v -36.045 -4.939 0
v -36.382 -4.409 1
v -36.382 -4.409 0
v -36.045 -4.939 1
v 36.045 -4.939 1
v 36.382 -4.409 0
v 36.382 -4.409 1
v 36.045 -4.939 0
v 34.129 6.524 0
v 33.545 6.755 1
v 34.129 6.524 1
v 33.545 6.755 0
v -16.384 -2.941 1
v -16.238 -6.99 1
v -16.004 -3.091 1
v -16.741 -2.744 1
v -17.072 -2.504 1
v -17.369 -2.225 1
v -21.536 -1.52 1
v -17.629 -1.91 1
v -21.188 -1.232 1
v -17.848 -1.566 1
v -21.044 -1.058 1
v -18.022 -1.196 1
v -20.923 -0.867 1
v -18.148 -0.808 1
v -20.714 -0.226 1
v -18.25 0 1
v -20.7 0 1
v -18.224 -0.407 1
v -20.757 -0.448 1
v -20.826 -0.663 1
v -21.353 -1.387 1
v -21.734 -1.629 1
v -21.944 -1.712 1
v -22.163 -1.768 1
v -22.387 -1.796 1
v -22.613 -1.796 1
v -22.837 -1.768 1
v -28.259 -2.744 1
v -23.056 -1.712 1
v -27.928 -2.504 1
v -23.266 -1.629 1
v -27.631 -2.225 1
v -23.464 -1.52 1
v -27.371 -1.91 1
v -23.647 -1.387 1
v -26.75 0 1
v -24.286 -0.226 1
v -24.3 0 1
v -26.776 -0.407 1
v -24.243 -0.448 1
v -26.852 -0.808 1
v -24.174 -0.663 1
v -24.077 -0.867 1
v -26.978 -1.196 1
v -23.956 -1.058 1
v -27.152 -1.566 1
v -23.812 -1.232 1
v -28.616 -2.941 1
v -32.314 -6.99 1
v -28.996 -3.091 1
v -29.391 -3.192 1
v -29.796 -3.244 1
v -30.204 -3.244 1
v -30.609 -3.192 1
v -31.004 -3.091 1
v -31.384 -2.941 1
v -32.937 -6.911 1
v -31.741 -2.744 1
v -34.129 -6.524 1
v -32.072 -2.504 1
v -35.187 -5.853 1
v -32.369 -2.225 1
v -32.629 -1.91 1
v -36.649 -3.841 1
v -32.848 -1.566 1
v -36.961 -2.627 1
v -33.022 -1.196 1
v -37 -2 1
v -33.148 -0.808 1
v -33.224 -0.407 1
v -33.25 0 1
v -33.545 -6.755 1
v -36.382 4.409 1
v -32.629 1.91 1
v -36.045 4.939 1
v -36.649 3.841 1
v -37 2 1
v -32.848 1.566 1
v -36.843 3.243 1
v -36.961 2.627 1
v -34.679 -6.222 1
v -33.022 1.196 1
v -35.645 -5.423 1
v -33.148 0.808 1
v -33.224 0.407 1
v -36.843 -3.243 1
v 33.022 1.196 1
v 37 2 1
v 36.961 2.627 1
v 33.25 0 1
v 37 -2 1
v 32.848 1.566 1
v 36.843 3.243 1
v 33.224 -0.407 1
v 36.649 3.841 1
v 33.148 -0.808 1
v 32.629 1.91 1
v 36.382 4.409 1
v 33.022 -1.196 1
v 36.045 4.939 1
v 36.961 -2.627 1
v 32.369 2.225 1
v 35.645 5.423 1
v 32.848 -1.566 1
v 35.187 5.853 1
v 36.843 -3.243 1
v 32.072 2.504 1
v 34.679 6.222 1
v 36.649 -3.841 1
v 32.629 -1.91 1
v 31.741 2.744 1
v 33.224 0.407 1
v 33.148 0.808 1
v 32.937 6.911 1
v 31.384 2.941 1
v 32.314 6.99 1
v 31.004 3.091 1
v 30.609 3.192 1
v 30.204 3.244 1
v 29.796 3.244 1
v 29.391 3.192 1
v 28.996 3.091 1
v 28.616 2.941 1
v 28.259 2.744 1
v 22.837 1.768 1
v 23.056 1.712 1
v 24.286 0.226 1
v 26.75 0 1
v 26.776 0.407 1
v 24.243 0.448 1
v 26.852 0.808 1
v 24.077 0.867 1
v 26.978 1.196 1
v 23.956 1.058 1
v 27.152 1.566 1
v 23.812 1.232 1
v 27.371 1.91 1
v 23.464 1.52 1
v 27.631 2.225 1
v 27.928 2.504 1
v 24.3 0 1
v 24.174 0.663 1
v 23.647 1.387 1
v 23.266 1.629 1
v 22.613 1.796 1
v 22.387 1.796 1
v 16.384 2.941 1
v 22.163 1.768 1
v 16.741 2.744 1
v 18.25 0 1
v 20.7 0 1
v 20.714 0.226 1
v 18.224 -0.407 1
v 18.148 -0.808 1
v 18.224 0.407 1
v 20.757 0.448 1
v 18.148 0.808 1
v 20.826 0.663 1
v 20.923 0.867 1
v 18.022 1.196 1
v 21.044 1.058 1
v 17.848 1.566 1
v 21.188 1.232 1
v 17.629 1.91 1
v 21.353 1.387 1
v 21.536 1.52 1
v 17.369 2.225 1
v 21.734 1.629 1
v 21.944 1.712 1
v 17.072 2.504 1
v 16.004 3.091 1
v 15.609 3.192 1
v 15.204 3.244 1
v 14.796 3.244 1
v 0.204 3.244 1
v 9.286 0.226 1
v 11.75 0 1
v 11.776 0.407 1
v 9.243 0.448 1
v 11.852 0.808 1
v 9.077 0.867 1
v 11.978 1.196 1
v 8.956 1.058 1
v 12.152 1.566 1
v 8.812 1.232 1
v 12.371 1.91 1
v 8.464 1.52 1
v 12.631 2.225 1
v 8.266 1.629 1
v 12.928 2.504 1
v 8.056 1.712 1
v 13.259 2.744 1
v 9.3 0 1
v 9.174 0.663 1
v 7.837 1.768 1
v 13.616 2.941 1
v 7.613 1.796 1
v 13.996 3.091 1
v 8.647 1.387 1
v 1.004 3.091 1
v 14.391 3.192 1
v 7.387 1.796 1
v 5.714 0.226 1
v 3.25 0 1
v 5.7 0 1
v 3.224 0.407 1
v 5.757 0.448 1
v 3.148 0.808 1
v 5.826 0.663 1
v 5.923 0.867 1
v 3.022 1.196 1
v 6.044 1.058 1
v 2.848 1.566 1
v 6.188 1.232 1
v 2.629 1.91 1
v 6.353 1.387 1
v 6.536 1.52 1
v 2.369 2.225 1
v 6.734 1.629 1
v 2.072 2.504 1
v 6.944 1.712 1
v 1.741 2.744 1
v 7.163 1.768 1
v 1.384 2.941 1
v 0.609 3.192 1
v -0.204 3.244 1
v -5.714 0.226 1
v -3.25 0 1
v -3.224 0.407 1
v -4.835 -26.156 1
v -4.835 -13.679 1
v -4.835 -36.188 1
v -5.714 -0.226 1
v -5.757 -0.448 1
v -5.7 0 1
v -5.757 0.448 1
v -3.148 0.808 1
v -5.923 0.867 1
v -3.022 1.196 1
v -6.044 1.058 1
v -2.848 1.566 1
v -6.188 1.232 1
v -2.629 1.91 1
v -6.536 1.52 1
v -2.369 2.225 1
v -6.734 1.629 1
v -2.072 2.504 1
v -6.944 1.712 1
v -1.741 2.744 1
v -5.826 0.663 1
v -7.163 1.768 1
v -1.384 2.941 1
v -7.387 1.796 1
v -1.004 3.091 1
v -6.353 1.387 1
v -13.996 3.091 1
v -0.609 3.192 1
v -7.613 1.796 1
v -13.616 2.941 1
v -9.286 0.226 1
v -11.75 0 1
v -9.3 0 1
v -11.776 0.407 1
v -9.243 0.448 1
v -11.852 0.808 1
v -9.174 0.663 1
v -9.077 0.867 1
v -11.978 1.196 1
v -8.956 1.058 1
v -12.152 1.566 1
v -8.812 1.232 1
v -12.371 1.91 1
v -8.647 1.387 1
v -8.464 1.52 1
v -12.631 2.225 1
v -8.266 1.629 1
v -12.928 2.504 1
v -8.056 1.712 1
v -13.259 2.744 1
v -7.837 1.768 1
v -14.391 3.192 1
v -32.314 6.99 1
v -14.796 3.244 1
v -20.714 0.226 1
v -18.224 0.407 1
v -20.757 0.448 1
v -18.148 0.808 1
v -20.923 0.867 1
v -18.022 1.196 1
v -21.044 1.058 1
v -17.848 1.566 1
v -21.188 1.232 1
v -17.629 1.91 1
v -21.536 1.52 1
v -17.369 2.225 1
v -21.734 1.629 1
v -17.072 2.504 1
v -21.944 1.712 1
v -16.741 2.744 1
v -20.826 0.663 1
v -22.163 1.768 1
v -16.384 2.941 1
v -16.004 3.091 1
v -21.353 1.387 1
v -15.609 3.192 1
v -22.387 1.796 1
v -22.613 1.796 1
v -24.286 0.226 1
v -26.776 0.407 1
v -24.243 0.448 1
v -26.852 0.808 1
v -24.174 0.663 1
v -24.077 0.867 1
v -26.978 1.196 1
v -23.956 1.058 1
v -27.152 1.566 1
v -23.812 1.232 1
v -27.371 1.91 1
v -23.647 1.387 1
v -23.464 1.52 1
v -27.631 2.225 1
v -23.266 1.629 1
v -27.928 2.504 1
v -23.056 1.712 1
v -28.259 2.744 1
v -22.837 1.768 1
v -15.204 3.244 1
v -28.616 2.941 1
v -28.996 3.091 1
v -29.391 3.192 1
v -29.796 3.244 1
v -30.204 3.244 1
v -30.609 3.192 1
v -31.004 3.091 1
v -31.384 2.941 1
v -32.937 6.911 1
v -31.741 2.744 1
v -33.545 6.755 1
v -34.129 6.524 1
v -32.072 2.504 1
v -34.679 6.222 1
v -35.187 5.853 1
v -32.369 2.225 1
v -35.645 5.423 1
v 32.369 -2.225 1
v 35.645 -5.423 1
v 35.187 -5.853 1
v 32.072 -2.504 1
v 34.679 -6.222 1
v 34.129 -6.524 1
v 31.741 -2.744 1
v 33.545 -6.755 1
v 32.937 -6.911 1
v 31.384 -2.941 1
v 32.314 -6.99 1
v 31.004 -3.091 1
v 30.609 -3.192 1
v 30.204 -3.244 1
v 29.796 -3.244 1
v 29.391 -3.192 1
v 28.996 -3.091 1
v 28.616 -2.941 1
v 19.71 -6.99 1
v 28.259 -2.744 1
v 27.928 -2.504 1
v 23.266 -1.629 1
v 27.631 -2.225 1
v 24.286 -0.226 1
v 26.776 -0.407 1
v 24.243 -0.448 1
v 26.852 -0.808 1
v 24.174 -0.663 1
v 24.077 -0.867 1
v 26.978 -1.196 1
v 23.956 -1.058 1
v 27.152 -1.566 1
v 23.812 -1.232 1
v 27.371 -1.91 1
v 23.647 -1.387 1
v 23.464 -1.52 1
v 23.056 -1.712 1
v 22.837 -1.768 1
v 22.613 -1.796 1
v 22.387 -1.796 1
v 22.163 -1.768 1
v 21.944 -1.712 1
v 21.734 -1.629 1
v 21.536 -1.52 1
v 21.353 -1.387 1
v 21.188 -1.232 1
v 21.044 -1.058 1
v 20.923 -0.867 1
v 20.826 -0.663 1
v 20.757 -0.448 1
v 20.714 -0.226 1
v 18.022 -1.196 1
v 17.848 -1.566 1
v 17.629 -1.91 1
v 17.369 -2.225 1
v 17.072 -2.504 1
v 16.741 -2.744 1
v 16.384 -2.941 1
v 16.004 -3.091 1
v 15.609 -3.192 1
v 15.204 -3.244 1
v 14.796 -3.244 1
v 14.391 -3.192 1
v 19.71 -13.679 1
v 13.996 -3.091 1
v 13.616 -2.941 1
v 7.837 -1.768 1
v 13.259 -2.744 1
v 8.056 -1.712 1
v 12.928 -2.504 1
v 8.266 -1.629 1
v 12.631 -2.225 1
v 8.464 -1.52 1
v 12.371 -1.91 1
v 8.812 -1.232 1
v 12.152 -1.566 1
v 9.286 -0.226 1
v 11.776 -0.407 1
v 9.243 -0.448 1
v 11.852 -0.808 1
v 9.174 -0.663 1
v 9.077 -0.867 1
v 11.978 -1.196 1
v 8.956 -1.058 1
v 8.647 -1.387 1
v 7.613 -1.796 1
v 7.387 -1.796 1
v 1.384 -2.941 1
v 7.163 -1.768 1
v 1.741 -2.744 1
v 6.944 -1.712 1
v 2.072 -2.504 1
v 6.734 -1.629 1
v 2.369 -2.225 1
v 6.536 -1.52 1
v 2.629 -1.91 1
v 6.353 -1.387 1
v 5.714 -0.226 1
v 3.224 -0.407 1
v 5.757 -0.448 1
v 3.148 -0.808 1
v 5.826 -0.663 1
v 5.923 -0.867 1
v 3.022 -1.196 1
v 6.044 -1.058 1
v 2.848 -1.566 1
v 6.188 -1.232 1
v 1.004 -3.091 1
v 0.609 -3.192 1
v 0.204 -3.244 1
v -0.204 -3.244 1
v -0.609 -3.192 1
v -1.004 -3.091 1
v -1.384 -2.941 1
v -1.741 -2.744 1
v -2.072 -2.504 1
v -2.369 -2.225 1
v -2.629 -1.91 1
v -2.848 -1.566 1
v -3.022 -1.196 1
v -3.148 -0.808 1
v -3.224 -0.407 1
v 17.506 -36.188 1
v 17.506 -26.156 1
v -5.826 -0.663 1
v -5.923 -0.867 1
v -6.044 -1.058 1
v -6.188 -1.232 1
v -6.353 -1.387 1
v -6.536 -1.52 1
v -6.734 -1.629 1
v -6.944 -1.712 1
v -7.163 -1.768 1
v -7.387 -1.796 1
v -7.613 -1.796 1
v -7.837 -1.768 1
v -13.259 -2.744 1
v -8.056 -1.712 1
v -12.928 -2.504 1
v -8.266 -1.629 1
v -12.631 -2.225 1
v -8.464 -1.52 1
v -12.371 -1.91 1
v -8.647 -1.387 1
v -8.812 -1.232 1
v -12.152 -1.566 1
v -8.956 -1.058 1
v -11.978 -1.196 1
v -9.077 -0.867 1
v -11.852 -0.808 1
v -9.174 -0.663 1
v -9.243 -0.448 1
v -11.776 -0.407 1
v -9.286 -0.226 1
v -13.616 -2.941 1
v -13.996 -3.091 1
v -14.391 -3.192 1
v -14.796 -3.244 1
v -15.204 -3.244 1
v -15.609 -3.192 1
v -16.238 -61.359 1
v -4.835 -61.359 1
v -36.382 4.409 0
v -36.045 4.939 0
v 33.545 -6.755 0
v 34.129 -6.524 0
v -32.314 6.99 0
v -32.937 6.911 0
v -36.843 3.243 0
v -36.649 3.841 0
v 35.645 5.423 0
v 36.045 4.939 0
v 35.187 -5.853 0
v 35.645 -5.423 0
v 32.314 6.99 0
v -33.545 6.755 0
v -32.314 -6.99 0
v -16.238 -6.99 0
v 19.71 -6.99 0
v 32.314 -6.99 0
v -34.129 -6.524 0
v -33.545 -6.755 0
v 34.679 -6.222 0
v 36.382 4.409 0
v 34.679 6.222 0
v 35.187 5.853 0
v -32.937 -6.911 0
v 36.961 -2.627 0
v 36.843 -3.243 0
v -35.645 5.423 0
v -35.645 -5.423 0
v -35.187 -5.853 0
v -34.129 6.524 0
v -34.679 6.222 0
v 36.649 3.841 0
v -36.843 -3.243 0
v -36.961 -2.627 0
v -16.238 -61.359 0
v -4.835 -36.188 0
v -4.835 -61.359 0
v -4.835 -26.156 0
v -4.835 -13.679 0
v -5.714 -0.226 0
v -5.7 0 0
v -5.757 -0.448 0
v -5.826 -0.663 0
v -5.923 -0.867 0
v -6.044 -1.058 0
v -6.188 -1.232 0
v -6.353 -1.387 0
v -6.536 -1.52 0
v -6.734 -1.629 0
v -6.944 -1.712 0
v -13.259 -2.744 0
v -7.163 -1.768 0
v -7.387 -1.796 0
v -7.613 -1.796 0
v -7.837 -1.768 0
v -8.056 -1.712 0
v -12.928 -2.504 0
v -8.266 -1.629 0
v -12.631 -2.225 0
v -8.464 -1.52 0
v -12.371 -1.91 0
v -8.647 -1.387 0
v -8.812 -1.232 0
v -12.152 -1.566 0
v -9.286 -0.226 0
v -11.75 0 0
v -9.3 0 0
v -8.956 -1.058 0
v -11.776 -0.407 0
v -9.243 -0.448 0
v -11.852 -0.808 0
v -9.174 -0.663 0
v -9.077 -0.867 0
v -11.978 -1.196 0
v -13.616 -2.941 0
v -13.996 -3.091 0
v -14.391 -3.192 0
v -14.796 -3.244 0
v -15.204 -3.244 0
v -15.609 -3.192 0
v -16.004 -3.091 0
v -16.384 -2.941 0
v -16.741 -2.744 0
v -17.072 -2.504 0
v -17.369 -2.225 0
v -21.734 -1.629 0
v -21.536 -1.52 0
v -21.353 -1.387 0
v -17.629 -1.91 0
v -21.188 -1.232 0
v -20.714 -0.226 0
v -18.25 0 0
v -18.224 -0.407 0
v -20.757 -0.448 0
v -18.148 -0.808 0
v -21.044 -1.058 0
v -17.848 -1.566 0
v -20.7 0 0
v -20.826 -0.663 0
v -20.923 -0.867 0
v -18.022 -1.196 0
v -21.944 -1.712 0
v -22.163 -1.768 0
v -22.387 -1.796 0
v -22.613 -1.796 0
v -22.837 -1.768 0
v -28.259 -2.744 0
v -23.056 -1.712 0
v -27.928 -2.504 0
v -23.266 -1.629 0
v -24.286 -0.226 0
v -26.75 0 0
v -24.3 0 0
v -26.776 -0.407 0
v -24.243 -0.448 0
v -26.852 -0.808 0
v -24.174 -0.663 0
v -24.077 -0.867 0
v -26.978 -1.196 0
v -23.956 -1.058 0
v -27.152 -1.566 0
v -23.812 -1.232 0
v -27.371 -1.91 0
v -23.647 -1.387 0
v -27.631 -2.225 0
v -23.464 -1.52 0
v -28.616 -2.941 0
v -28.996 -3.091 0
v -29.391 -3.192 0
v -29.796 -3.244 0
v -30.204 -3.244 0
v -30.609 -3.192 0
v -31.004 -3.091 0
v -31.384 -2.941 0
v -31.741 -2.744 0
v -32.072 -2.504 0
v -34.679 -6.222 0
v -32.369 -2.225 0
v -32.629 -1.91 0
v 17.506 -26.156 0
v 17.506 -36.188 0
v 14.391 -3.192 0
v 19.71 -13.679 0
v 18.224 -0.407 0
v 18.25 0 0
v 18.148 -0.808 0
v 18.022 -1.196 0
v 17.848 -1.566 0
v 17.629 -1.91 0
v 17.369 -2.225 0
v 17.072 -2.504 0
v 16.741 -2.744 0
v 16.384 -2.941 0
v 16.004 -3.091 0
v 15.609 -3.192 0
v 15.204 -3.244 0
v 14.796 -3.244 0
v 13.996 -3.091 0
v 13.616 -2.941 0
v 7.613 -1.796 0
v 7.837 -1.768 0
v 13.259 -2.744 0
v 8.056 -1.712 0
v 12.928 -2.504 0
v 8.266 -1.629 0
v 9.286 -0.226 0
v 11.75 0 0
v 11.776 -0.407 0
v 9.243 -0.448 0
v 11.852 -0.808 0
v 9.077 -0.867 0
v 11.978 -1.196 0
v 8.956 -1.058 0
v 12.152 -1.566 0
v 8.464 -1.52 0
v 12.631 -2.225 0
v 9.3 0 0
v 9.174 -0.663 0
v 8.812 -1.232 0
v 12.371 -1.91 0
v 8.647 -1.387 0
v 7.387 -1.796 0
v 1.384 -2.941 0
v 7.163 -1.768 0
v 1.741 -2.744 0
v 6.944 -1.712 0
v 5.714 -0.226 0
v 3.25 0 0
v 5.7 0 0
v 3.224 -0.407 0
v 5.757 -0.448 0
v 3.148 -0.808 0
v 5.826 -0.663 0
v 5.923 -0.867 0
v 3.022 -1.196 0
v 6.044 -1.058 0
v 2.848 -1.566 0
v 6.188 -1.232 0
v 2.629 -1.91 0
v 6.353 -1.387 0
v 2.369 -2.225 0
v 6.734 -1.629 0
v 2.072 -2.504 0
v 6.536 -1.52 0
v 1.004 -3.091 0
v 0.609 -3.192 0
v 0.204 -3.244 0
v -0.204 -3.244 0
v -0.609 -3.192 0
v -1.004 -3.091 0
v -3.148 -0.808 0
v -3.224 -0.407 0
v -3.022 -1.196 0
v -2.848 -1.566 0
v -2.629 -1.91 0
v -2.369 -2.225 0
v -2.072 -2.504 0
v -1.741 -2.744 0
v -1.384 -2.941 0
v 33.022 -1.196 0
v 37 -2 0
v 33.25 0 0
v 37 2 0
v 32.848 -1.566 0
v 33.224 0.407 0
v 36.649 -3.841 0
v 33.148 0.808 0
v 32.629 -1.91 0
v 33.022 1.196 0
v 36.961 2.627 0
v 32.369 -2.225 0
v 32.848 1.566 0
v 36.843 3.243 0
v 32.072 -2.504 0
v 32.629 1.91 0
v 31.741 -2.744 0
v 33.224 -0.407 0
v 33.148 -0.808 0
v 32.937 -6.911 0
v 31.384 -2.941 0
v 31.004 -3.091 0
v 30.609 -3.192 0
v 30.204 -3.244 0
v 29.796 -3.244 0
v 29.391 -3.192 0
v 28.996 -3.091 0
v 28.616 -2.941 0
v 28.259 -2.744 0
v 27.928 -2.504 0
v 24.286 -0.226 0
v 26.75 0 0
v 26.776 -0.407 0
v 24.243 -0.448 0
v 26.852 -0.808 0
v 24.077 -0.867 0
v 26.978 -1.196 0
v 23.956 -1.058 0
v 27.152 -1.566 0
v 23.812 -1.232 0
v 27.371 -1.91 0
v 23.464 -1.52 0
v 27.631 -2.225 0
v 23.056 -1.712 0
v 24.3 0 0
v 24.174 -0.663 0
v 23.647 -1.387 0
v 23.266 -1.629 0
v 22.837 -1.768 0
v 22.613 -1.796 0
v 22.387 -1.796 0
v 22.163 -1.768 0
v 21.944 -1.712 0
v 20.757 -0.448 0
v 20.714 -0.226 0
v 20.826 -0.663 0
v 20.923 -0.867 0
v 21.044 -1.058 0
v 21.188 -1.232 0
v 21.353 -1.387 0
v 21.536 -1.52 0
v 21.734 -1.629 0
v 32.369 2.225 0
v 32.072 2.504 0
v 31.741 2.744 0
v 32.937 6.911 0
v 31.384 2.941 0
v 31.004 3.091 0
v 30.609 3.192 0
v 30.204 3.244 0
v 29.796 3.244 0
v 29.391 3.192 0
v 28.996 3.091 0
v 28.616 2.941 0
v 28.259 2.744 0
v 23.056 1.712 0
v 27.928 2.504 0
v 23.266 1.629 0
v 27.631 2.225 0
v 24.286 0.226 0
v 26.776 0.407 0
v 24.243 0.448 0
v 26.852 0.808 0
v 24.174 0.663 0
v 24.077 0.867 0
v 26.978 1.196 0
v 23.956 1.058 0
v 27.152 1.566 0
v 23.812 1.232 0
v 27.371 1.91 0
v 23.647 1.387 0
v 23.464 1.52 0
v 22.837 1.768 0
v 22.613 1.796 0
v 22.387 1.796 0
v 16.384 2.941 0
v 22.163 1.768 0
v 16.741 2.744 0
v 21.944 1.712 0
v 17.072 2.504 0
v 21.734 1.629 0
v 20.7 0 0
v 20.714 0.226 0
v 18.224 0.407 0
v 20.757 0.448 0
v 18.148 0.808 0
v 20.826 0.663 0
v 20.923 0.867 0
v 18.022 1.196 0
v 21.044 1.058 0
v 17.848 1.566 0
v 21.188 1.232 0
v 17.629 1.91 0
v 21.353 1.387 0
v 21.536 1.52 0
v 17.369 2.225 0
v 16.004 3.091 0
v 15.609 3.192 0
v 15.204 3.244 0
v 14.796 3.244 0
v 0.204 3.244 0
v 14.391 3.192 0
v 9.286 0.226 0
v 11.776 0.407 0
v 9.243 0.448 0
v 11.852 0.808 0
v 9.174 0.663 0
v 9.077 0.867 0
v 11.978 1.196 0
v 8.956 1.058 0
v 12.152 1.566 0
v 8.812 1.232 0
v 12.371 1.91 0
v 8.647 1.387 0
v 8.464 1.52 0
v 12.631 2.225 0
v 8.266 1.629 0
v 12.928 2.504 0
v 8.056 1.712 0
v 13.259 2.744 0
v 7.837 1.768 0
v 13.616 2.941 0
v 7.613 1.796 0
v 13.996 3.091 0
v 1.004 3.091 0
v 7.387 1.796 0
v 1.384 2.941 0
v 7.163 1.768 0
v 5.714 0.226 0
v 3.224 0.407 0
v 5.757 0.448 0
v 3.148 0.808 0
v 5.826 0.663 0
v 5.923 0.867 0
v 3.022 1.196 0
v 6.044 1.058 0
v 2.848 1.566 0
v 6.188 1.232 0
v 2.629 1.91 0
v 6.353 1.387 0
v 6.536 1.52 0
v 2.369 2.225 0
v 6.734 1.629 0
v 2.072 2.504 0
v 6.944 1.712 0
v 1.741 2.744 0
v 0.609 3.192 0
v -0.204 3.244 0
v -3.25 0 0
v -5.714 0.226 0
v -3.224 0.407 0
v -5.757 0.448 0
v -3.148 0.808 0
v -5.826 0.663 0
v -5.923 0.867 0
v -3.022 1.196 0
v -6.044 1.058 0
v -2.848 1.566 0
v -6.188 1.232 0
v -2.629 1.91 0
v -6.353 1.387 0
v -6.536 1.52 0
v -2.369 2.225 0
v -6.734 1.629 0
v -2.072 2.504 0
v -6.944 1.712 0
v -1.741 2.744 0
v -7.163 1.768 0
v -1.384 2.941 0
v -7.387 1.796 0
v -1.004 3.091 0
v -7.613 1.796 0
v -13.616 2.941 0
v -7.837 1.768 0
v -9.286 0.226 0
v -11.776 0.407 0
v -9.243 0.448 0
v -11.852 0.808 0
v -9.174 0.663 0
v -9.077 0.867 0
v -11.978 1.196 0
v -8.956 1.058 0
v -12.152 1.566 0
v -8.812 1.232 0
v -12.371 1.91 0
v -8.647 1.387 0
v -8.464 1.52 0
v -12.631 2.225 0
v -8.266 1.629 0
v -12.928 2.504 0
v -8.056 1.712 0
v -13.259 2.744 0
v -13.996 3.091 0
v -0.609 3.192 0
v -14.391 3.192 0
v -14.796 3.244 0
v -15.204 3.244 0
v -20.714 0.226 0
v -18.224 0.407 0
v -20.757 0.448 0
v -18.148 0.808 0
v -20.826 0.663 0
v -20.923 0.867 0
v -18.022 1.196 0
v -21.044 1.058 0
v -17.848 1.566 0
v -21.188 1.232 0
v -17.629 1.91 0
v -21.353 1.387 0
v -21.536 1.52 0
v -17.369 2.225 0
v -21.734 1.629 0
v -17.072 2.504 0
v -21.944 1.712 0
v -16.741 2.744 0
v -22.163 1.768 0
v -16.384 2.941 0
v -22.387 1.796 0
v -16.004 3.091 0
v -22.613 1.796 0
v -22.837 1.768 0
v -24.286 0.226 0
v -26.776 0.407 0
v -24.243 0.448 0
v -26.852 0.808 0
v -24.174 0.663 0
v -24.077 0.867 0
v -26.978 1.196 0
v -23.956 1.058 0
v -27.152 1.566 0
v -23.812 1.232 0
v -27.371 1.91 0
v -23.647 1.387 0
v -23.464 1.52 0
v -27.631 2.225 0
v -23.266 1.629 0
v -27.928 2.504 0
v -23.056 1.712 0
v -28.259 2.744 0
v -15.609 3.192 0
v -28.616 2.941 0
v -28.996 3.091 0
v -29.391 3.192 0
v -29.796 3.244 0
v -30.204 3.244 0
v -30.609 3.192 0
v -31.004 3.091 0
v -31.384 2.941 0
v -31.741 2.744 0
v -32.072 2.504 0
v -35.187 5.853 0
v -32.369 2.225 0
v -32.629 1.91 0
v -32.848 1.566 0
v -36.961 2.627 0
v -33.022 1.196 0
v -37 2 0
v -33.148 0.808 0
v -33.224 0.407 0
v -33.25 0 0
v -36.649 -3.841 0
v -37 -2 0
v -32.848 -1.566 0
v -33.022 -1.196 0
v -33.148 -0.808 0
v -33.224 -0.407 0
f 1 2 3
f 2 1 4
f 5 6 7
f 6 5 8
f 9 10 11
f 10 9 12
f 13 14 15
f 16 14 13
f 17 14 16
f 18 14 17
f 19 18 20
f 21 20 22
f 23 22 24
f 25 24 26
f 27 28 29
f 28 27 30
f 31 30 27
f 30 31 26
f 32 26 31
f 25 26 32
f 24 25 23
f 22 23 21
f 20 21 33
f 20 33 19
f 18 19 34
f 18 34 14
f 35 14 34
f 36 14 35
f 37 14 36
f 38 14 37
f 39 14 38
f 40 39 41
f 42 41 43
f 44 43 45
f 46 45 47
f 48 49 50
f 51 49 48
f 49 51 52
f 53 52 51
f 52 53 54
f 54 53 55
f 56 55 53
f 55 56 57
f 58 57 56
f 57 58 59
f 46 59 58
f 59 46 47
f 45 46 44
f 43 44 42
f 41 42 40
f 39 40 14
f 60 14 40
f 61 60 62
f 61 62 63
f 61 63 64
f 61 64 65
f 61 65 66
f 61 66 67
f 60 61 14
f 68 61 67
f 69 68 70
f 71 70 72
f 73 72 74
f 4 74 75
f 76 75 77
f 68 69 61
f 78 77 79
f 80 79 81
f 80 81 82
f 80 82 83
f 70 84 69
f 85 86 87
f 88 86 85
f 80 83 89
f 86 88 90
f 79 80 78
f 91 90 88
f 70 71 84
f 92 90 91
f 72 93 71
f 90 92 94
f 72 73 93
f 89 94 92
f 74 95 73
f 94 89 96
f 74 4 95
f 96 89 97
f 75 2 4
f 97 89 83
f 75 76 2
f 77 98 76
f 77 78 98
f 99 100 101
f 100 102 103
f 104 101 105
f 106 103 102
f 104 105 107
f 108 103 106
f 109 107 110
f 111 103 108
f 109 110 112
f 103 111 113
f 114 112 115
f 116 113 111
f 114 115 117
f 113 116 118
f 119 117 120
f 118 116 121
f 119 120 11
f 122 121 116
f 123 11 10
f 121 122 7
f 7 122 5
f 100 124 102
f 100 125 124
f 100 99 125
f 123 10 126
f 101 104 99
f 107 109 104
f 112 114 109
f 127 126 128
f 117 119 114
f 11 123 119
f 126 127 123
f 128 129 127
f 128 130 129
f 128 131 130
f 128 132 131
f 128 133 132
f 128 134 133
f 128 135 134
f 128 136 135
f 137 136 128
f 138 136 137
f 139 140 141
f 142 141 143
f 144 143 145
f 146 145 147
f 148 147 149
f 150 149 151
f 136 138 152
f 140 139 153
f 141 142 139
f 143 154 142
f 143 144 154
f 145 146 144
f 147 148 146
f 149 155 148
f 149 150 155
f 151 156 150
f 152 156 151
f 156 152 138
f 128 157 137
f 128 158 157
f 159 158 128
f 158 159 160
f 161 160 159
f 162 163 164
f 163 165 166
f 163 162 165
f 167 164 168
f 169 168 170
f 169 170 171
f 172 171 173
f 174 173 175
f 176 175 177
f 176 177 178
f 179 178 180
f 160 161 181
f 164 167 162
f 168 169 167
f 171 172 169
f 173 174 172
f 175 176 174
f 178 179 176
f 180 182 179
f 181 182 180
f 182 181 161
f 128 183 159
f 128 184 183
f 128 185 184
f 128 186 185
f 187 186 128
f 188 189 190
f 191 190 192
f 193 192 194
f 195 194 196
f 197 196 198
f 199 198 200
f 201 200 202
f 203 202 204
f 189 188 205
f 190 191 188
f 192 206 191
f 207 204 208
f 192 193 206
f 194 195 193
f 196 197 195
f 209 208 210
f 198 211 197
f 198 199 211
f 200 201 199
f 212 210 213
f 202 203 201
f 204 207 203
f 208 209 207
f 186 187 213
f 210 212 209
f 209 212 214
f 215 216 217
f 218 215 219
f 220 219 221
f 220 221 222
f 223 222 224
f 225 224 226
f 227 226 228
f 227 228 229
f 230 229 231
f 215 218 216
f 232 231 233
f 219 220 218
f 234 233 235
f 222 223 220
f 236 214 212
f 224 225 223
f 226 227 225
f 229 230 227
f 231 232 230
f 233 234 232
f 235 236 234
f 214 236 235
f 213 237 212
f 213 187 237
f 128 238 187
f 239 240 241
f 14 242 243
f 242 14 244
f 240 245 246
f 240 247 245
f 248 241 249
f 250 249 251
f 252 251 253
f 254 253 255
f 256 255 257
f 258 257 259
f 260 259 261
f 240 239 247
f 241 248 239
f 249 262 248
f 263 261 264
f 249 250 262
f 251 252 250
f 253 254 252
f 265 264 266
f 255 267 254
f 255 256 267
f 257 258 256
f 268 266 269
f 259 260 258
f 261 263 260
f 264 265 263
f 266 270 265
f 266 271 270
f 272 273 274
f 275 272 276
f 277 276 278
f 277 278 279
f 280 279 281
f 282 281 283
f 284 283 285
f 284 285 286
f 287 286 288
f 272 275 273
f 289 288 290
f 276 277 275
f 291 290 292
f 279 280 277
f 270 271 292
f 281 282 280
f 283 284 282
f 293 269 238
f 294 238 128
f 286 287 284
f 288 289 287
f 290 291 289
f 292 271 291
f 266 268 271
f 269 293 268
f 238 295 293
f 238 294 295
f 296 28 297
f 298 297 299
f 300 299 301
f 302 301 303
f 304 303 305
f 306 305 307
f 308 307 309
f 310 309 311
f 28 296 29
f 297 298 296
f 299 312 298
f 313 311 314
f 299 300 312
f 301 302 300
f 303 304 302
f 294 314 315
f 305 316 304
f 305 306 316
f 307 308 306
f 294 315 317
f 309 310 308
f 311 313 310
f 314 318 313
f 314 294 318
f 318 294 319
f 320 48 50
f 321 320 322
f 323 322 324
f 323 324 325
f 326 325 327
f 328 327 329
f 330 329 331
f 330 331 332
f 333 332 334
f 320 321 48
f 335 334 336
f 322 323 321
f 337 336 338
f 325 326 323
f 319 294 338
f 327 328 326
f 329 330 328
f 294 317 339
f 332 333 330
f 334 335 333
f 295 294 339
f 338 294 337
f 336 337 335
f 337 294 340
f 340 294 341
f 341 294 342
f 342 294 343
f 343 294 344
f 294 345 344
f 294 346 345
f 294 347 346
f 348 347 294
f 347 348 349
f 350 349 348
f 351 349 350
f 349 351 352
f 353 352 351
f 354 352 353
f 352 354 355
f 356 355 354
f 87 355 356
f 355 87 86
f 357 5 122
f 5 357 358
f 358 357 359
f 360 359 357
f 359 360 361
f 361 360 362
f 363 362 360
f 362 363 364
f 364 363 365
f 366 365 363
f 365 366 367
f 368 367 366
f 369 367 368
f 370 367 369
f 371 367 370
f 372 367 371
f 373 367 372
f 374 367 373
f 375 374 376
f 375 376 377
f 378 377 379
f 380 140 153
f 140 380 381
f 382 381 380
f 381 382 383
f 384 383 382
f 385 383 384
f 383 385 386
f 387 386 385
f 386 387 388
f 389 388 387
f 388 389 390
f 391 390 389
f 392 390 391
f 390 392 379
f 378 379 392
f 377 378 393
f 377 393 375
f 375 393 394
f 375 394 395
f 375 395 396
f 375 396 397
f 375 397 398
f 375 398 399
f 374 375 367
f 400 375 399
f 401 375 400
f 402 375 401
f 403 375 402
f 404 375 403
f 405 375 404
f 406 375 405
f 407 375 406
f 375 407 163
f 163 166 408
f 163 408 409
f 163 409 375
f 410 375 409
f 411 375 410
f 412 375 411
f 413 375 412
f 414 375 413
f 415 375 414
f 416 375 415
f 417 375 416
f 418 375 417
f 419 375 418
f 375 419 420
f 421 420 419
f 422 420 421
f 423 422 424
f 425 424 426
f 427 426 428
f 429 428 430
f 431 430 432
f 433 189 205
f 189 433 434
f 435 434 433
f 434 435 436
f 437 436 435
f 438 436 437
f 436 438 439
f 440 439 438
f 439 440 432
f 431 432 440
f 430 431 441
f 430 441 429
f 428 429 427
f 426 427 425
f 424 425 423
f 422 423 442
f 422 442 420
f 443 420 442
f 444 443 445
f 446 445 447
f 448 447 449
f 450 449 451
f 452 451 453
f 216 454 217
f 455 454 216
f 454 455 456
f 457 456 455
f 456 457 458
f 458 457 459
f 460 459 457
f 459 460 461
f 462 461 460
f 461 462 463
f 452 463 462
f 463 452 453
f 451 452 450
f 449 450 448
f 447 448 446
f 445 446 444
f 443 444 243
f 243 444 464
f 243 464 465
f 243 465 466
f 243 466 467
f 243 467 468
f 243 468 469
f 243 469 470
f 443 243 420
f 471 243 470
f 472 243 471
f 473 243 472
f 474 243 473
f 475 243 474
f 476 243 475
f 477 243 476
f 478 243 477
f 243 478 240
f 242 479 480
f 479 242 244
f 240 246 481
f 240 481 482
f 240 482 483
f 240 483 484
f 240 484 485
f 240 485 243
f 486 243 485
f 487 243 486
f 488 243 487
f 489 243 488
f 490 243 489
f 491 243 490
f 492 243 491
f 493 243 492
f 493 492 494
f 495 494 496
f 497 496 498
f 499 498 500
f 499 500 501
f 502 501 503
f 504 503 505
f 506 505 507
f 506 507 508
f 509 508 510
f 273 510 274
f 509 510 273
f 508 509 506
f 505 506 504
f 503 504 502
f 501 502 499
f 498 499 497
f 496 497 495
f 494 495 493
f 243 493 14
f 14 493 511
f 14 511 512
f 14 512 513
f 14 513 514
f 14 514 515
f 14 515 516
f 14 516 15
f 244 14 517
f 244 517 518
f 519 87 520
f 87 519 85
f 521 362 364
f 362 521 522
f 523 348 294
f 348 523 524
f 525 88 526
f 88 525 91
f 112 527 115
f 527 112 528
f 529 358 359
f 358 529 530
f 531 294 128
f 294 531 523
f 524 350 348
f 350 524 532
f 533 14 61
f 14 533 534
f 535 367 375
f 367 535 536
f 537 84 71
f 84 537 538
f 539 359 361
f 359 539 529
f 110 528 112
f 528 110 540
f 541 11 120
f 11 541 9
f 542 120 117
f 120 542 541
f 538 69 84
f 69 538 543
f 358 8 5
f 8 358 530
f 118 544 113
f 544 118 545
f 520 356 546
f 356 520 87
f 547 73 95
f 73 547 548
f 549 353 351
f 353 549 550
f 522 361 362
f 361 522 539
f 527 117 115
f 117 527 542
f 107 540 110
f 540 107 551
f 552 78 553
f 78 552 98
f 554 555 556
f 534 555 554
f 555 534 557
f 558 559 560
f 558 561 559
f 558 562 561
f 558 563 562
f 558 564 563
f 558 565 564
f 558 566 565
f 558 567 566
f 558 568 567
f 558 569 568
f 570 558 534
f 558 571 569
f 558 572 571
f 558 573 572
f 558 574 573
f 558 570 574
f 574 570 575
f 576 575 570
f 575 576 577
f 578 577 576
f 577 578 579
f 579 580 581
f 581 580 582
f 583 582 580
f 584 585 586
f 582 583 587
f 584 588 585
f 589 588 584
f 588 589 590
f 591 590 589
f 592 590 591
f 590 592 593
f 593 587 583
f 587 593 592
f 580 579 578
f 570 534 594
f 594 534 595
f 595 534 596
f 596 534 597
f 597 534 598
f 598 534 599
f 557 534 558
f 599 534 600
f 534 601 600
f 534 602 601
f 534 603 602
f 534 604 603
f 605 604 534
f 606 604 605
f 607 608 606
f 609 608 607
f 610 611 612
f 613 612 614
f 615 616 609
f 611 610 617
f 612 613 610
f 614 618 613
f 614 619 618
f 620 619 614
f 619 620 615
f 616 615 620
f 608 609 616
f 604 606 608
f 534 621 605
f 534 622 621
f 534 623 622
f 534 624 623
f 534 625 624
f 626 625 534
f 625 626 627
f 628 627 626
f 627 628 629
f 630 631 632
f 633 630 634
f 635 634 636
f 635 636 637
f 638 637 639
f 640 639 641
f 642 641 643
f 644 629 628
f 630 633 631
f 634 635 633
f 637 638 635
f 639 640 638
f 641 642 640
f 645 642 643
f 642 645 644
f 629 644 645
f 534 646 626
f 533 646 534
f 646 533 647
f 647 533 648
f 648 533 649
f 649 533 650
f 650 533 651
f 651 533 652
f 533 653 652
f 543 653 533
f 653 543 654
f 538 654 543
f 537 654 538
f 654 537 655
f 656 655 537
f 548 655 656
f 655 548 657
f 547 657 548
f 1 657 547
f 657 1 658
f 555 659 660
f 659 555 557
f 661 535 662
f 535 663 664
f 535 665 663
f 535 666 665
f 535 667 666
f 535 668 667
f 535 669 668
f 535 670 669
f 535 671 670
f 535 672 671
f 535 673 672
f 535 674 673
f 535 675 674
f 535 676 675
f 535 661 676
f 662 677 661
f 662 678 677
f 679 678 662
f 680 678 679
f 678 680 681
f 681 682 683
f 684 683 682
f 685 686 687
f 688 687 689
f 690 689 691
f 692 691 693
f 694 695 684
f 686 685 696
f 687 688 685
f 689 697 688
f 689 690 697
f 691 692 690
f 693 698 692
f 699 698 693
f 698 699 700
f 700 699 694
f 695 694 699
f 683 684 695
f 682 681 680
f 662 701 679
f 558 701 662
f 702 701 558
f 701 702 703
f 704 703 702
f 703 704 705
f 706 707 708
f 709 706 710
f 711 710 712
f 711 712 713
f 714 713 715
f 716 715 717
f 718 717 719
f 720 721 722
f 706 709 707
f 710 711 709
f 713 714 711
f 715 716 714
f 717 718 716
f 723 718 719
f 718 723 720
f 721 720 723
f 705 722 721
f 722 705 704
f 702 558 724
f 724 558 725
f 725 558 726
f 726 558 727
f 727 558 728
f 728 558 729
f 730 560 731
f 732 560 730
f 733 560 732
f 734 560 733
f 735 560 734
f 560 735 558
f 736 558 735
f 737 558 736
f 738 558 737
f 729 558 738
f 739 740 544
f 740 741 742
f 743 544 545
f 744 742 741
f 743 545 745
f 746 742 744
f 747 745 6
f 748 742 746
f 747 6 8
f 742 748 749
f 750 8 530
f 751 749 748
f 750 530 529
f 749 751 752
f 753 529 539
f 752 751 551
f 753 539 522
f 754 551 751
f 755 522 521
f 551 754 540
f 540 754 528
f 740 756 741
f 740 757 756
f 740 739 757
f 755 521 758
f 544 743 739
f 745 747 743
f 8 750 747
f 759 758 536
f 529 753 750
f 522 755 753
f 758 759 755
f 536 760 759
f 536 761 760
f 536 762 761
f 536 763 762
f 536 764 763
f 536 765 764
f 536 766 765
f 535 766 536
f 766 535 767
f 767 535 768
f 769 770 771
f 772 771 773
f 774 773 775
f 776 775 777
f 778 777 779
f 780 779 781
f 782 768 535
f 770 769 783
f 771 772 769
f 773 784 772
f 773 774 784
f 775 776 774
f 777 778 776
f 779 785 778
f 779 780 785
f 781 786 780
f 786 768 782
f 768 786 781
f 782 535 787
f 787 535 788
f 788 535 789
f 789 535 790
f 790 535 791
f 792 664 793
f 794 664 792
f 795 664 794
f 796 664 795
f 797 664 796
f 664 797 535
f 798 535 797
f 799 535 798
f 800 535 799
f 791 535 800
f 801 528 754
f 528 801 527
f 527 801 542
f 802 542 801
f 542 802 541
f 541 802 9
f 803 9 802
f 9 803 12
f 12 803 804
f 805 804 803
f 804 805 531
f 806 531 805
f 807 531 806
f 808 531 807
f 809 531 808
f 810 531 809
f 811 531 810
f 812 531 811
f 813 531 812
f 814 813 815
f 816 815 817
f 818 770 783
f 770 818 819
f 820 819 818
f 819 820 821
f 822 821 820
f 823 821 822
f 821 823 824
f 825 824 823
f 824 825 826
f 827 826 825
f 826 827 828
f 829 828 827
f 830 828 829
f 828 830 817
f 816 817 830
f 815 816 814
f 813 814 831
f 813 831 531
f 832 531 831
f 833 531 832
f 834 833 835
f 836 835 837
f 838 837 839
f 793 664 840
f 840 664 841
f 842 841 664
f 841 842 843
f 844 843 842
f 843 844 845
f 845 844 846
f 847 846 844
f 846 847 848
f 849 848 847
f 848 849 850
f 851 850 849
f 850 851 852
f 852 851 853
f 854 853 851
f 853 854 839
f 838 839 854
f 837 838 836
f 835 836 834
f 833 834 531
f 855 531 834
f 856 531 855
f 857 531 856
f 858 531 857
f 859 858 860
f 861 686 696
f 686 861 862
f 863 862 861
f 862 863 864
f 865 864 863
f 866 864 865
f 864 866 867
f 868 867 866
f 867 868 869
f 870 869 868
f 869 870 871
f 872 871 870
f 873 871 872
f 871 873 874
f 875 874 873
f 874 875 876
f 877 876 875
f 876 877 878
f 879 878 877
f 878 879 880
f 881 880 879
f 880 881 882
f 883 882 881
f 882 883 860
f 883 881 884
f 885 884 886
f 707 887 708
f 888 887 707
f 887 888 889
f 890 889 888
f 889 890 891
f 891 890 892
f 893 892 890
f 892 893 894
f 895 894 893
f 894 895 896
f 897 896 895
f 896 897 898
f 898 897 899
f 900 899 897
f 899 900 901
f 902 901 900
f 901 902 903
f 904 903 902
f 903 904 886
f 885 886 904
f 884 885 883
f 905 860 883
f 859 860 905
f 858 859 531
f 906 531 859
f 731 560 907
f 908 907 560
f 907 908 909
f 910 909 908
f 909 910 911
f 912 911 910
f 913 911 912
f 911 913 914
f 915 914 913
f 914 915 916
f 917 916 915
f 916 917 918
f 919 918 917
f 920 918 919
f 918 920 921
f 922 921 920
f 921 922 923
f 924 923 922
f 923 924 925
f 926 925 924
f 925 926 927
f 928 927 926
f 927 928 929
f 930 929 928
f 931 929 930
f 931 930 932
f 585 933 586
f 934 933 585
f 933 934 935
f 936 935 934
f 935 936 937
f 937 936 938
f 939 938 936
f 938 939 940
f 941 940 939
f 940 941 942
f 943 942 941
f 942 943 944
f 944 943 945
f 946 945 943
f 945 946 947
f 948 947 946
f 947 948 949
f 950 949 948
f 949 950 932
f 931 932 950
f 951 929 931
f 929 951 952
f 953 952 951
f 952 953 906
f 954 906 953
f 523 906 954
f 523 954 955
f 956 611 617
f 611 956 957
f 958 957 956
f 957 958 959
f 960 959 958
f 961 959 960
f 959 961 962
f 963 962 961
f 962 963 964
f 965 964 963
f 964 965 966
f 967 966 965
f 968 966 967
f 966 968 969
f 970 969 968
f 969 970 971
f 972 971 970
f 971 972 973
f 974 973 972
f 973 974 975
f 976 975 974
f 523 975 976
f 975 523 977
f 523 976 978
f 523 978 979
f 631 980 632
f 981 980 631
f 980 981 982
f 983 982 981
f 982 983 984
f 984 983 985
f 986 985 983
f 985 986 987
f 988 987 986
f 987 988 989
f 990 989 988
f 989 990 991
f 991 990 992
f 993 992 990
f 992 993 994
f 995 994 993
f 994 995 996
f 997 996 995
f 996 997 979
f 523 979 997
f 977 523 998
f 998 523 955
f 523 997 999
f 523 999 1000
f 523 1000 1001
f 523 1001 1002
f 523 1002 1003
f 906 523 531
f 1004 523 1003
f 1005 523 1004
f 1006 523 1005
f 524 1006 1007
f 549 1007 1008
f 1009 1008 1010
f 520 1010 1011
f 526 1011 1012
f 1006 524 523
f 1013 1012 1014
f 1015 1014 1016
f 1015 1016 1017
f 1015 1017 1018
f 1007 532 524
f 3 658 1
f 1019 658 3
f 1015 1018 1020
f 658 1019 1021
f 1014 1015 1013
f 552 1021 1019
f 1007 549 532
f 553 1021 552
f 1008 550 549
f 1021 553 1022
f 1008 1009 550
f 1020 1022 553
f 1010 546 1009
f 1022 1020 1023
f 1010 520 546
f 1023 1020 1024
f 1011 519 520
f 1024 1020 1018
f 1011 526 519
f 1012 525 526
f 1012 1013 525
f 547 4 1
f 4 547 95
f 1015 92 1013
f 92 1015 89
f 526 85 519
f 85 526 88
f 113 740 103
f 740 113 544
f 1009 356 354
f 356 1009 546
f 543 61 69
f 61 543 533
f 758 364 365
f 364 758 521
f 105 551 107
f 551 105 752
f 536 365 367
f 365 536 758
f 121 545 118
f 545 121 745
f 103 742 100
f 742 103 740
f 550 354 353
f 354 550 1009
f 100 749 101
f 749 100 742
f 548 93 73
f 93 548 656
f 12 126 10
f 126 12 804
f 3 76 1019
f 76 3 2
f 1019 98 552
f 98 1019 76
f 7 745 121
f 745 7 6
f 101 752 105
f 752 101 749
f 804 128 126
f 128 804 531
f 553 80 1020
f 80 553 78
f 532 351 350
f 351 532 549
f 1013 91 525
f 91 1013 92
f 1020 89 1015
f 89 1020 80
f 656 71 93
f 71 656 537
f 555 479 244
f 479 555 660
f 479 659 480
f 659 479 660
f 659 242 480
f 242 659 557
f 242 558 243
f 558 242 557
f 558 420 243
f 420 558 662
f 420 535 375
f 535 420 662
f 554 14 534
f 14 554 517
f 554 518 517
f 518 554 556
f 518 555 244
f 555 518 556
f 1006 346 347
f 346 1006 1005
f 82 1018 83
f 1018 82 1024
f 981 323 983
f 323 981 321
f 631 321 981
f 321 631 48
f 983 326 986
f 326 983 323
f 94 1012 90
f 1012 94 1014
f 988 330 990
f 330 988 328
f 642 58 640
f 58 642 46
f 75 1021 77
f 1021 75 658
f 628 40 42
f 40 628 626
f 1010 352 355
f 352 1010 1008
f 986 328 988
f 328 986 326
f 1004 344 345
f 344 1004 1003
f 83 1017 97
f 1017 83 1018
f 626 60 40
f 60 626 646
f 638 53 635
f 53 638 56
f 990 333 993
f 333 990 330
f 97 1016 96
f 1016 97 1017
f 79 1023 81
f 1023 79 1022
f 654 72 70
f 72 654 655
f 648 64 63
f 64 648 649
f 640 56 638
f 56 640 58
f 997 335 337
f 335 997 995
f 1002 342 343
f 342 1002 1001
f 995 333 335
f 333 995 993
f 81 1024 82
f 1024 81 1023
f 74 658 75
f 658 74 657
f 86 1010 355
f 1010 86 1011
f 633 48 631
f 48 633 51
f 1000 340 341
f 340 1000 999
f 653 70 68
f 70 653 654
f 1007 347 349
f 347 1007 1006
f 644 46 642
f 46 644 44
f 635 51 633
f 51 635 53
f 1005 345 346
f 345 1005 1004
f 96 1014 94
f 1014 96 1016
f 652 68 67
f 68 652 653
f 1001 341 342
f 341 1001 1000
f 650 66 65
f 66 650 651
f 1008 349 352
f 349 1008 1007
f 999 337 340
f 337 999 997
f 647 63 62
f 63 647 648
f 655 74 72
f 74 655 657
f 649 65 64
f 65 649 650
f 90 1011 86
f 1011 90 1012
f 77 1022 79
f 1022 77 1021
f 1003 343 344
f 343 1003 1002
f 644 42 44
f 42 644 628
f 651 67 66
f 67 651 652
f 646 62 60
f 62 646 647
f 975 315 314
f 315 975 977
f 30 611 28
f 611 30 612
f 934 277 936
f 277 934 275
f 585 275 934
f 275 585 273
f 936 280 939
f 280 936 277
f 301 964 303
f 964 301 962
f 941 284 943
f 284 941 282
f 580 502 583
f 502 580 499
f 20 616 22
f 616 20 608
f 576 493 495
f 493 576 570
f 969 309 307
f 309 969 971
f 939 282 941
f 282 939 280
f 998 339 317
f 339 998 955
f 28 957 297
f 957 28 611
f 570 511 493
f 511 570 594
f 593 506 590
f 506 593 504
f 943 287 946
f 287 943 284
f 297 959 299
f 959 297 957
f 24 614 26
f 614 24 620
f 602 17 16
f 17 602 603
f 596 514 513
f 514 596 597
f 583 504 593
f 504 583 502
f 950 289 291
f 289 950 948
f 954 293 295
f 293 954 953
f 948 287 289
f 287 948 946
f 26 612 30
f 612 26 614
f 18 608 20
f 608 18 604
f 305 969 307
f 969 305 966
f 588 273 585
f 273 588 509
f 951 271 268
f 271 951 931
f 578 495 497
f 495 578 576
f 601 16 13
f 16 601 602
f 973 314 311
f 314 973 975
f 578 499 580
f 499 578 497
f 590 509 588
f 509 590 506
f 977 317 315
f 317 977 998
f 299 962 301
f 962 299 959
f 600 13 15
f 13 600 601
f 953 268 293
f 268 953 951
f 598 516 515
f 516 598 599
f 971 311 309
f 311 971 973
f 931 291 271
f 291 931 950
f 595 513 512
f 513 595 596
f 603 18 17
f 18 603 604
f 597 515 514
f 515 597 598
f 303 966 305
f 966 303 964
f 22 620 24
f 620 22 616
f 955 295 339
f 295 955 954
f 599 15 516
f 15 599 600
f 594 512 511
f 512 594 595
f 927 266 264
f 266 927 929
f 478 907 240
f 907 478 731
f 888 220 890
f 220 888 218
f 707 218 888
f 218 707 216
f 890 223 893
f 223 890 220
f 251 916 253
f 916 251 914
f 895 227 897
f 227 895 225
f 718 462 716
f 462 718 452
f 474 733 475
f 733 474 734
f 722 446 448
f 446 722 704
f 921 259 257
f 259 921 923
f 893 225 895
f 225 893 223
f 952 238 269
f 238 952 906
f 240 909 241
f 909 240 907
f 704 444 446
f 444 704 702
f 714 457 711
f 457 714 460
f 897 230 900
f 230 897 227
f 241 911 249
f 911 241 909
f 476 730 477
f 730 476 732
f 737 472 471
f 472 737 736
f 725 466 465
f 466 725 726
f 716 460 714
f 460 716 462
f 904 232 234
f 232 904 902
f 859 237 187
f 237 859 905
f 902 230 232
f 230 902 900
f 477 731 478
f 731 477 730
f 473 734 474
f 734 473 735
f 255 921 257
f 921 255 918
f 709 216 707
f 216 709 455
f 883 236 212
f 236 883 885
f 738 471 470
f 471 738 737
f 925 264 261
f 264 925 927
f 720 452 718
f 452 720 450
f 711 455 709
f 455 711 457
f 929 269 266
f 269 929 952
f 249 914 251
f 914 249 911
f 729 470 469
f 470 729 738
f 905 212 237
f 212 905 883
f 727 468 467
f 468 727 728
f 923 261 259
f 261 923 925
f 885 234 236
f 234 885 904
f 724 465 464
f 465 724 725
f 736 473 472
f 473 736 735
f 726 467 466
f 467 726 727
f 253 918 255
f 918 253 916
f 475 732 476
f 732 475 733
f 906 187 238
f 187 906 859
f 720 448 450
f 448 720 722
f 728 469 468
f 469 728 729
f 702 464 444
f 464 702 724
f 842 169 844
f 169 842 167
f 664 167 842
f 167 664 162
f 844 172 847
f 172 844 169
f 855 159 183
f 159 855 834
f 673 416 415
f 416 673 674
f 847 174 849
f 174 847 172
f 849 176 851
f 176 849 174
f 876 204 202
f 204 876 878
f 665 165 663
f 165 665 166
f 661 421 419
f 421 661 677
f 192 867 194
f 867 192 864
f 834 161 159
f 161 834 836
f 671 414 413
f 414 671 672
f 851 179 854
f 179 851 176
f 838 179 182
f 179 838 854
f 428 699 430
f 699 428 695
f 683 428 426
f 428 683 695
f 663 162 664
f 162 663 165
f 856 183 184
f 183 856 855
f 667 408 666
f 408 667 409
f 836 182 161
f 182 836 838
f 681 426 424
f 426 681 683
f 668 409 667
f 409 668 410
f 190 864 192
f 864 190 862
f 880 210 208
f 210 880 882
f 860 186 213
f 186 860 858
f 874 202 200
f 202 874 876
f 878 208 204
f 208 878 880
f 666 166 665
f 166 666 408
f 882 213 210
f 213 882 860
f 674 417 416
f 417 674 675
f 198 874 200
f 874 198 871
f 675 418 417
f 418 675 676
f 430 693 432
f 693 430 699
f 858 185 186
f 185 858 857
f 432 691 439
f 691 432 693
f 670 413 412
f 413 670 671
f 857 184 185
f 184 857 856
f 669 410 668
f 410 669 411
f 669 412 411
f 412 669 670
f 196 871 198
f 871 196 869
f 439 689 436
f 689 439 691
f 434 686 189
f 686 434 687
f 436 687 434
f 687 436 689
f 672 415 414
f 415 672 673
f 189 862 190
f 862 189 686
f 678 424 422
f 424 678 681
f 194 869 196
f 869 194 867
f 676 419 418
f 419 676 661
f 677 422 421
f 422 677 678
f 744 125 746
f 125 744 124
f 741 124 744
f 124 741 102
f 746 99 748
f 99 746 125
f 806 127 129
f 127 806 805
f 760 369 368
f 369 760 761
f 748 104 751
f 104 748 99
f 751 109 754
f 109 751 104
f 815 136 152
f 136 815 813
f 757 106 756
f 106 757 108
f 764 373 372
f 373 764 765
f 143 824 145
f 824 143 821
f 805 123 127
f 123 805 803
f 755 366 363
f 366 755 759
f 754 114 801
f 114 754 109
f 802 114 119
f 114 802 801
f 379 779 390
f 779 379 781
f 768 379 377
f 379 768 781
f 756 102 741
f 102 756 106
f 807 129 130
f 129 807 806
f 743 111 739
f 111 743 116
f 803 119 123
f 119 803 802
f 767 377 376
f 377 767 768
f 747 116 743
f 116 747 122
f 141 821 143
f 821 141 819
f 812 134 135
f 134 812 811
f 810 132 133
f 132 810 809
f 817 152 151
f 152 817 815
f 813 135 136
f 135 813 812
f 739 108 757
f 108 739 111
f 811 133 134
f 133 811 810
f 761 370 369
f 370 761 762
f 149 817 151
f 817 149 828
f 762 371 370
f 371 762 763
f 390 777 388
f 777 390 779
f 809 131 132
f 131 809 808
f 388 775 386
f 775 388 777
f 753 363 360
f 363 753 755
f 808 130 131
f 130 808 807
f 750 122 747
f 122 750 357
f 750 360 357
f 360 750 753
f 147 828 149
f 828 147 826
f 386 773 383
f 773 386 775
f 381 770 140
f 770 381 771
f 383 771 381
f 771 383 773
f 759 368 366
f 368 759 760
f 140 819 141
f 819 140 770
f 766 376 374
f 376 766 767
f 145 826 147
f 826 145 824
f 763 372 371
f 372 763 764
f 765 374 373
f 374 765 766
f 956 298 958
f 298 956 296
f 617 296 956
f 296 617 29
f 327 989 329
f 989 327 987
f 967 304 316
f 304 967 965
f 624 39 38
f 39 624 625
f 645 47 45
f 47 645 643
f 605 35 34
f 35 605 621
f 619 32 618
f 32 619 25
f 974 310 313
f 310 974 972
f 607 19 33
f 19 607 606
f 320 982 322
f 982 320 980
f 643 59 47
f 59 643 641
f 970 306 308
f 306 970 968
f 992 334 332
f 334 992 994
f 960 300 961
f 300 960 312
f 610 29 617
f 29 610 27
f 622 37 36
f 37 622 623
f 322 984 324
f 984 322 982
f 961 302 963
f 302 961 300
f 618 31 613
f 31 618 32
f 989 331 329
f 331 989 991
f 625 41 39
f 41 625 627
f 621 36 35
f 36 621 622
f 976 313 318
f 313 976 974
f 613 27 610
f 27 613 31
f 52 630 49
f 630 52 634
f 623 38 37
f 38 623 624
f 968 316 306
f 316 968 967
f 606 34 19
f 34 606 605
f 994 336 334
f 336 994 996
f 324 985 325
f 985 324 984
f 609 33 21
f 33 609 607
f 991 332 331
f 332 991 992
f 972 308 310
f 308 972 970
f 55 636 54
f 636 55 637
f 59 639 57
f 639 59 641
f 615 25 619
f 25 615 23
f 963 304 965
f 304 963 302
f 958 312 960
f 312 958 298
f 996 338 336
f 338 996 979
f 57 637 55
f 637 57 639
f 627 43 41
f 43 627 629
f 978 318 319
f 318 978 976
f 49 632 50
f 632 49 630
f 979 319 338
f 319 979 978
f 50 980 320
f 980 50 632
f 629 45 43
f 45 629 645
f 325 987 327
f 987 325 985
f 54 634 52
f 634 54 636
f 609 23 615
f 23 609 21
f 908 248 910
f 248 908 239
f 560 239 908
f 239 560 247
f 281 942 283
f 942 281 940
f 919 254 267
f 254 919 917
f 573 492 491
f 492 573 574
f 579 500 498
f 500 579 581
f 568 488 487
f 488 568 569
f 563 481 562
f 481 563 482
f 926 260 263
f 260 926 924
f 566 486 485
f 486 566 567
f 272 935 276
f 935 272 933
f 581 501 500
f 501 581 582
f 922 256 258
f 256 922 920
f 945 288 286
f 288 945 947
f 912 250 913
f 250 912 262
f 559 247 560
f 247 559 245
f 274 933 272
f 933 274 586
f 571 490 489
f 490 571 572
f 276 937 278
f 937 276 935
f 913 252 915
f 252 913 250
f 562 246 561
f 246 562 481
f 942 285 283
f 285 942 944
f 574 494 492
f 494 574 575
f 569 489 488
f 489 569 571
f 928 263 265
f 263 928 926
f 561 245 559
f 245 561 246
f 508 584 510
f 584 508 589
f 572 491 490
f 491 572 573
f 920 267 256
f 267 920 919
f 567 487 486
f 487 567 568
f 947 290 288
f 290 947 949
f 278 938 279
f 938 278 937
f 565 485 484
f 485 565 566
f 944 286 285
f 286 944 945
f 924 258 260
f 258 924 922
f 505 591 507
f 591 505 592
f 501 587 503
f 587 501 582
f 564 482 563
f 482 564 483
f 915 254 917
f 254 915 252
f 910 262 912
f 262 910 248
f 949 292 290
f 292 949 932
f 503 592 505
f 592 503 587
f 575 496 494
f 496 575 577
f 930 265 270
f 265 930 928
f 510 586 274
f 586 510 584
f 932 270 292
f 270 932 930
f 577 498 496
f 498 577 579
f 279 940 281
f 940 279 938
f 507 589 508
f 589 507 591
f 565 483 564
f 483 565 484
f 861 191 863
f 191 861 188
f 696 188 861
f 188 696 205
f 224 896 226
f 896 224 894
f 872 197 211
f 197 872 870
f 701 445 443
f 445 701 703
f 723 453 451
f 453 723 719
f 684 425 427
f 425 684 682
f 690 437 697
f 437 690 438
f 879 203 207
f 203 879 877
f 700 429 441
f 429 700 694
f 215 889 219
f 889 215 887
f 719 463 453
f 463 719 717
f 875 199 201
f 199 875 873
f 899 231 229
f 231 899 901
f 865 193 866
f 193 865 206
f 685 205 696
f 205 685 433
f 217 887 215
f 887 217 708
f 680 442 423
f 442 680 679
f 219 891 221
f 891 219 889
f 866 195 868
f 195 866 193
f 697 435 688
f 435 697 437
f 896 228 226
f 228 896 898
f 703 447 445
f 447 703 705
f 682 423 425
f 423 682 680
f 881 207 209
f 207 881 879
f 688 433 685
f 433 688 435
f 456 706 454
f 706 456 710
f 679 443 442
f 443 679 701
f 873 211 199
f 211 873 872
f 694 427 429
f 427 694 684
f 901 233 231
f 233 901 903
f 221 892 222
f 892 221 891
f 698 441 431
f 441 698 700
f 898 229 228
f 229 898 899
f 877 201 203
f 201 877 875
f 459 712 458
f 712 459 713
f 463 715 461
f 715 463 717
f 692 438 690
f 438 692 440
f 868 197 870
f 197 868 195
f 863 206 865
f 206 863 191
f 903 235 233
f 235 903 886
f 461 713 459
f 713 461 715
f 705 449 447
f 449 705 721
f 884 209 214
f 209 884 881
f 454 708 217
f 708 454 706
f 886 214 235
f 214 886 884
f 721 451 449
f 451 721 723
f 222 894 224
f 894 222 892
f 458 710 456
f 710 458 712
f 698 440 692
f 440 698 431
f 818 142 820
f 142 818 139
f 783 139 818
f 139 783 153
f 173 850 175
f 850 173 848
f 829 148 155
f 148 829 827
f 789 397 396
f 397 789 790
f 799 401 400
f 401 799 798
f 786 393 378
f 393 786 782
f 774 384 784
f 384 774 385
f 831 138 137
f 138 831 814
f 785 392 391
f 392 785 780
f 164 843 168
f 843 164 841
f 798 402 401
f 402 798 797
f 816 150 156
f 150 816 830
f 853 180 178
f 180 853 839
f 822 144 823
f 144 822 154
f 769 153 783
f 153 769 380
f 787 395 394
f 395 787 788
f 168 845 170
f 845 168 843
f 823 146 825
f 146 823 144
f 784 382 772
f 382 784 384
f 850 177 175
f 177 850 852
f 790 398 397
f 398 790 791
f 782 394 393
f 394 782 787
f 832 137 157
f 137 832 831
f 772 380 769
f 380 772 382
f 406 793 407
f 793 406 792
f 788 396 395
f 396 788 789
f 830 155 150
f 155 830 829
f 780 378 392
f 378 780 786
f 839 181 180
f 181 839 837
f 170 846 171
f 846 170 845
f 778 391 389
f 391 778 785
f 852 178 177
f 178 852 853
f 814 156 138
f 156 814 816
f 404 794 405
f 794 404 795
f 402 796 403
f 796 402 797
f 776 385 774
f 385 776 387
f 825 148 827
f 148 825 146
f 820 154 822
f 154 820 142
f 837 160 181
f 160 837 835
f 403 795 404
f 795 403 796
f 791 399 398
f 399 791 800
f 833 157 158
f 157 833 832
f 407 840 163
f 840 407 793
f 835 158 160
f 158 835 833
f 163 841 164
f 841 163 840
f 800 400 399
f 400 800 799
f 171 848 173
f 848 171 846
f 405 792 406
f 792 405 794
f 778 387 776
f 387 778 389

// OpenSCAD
$fn = 50;


difference() {
	union() {
		hull() {
			translate(v = [-32.0000000000, 2.0000000000, 0]) {
				cylinder(h = 1, r = 5);
			}
			translate(v = [32.0000000000, 2.0000000000, 0]) {
				cylinder(h = 1, r = 5);
			}
			translate(v = [-32.0000000000, -2.0000000000, 0]) {
				cylinder(h = 1, r = 5);
			}
			translate(v = [32.0000000000, -2.0000000000, 0]) {
				cylinder(h = 1, r = 5);
			}
		}
		translate(v = [0, -5, 0]) {
			linear_extrude(height = 1) {
				text(font = "DejaVu Sans Mono:style=Bold", halign = "center", size = 57.0000000000, text = "F", valign = "top");
			}
		}
	}
	union() {
		translate(v = [-30.0000000000, 0.0000000000, 0]) {
			translate(v = [0, 0, -100]) {
				cylinder(h = 200, r = 3.2500000000);
			}
		}
		translate(v = [-15.0000000000, 0.0000000000, 0]) {
			translate(v = [0, 0, -100]) {
				cylinder(h = 200, r = 3.2500000000);
			}
		}
		translate(v = [0, 0, -100]) {
			cylinder(h = 200, r = 3.2500000000);
		}
		translate(v = [15.0000000000, 0.0000000000, 0]) {
			translate(v = [0, 0, -100]) {
				cylinder(h = 200, r = 3.2500000000);
			}
		}
		translate(v = [30.0000000000, 0.0000000000, 0]) {
			translate(v = [0, 0, -100]) {
				cylinder(h = 200, r = 3.2500000000);
			}
		}
		translate(v = [-30.0000000000, 0.0000000000, 0]) {
			translate(v = [0, 0, -100]) {
				cylinder(h = 200, r = 1.8000000000);
			}
		}
		translate(v = [-22.5000000000, 0.0000000000, 0]) {
			translate(v = [0, 0, -100]) {
				cylinder(h = 200, r = 1.8000000000);
			}
		}
		translate(v = [-15.0000000000, 0.0000000000, 0]) {
			translate(v = [0, 0, -100]) {
				cylinder(h = 200, r = 1.8000000000);
			}
		}
		translate(v = [-7.5000000000, 0.0000000000, 0]) {
			translate(v = [0, 0, -100]) {
				cylinder(h = 200, r = 1.8000000000);
			}
		}
		translate(v = [0, 0, -100]) {
			cylinder(h = 200, r = 1.8000000000);
		}
		translate(v = [7.5000000000, 0.0000000000, 0]) {
			translate(v = [0, 0, -100]) {
				cylinder(h = 200, r = 1.8000000000);
			}
		}
		translate(v = [15.0000000000, 0.0000000000, 0]) {
			translate(v = [0, 0, -100]) {
				cylinder(h = 200, r = 1.8000000000);
			}
		}
		translate(v = [22.5000000000, 0.0000000000, 0]) {
			translate(v = [0, 0, -100]) {
				cylinder(h = 200, r = 1.8000000000);
			}
		}
		translate(v = [30.0000000000, 0.0000000000, 0]) {
			translate(v = [0, 0, -100]) {
				cylinder(h = 200, r = 1.8000000000);
			}
		}
	}
}
